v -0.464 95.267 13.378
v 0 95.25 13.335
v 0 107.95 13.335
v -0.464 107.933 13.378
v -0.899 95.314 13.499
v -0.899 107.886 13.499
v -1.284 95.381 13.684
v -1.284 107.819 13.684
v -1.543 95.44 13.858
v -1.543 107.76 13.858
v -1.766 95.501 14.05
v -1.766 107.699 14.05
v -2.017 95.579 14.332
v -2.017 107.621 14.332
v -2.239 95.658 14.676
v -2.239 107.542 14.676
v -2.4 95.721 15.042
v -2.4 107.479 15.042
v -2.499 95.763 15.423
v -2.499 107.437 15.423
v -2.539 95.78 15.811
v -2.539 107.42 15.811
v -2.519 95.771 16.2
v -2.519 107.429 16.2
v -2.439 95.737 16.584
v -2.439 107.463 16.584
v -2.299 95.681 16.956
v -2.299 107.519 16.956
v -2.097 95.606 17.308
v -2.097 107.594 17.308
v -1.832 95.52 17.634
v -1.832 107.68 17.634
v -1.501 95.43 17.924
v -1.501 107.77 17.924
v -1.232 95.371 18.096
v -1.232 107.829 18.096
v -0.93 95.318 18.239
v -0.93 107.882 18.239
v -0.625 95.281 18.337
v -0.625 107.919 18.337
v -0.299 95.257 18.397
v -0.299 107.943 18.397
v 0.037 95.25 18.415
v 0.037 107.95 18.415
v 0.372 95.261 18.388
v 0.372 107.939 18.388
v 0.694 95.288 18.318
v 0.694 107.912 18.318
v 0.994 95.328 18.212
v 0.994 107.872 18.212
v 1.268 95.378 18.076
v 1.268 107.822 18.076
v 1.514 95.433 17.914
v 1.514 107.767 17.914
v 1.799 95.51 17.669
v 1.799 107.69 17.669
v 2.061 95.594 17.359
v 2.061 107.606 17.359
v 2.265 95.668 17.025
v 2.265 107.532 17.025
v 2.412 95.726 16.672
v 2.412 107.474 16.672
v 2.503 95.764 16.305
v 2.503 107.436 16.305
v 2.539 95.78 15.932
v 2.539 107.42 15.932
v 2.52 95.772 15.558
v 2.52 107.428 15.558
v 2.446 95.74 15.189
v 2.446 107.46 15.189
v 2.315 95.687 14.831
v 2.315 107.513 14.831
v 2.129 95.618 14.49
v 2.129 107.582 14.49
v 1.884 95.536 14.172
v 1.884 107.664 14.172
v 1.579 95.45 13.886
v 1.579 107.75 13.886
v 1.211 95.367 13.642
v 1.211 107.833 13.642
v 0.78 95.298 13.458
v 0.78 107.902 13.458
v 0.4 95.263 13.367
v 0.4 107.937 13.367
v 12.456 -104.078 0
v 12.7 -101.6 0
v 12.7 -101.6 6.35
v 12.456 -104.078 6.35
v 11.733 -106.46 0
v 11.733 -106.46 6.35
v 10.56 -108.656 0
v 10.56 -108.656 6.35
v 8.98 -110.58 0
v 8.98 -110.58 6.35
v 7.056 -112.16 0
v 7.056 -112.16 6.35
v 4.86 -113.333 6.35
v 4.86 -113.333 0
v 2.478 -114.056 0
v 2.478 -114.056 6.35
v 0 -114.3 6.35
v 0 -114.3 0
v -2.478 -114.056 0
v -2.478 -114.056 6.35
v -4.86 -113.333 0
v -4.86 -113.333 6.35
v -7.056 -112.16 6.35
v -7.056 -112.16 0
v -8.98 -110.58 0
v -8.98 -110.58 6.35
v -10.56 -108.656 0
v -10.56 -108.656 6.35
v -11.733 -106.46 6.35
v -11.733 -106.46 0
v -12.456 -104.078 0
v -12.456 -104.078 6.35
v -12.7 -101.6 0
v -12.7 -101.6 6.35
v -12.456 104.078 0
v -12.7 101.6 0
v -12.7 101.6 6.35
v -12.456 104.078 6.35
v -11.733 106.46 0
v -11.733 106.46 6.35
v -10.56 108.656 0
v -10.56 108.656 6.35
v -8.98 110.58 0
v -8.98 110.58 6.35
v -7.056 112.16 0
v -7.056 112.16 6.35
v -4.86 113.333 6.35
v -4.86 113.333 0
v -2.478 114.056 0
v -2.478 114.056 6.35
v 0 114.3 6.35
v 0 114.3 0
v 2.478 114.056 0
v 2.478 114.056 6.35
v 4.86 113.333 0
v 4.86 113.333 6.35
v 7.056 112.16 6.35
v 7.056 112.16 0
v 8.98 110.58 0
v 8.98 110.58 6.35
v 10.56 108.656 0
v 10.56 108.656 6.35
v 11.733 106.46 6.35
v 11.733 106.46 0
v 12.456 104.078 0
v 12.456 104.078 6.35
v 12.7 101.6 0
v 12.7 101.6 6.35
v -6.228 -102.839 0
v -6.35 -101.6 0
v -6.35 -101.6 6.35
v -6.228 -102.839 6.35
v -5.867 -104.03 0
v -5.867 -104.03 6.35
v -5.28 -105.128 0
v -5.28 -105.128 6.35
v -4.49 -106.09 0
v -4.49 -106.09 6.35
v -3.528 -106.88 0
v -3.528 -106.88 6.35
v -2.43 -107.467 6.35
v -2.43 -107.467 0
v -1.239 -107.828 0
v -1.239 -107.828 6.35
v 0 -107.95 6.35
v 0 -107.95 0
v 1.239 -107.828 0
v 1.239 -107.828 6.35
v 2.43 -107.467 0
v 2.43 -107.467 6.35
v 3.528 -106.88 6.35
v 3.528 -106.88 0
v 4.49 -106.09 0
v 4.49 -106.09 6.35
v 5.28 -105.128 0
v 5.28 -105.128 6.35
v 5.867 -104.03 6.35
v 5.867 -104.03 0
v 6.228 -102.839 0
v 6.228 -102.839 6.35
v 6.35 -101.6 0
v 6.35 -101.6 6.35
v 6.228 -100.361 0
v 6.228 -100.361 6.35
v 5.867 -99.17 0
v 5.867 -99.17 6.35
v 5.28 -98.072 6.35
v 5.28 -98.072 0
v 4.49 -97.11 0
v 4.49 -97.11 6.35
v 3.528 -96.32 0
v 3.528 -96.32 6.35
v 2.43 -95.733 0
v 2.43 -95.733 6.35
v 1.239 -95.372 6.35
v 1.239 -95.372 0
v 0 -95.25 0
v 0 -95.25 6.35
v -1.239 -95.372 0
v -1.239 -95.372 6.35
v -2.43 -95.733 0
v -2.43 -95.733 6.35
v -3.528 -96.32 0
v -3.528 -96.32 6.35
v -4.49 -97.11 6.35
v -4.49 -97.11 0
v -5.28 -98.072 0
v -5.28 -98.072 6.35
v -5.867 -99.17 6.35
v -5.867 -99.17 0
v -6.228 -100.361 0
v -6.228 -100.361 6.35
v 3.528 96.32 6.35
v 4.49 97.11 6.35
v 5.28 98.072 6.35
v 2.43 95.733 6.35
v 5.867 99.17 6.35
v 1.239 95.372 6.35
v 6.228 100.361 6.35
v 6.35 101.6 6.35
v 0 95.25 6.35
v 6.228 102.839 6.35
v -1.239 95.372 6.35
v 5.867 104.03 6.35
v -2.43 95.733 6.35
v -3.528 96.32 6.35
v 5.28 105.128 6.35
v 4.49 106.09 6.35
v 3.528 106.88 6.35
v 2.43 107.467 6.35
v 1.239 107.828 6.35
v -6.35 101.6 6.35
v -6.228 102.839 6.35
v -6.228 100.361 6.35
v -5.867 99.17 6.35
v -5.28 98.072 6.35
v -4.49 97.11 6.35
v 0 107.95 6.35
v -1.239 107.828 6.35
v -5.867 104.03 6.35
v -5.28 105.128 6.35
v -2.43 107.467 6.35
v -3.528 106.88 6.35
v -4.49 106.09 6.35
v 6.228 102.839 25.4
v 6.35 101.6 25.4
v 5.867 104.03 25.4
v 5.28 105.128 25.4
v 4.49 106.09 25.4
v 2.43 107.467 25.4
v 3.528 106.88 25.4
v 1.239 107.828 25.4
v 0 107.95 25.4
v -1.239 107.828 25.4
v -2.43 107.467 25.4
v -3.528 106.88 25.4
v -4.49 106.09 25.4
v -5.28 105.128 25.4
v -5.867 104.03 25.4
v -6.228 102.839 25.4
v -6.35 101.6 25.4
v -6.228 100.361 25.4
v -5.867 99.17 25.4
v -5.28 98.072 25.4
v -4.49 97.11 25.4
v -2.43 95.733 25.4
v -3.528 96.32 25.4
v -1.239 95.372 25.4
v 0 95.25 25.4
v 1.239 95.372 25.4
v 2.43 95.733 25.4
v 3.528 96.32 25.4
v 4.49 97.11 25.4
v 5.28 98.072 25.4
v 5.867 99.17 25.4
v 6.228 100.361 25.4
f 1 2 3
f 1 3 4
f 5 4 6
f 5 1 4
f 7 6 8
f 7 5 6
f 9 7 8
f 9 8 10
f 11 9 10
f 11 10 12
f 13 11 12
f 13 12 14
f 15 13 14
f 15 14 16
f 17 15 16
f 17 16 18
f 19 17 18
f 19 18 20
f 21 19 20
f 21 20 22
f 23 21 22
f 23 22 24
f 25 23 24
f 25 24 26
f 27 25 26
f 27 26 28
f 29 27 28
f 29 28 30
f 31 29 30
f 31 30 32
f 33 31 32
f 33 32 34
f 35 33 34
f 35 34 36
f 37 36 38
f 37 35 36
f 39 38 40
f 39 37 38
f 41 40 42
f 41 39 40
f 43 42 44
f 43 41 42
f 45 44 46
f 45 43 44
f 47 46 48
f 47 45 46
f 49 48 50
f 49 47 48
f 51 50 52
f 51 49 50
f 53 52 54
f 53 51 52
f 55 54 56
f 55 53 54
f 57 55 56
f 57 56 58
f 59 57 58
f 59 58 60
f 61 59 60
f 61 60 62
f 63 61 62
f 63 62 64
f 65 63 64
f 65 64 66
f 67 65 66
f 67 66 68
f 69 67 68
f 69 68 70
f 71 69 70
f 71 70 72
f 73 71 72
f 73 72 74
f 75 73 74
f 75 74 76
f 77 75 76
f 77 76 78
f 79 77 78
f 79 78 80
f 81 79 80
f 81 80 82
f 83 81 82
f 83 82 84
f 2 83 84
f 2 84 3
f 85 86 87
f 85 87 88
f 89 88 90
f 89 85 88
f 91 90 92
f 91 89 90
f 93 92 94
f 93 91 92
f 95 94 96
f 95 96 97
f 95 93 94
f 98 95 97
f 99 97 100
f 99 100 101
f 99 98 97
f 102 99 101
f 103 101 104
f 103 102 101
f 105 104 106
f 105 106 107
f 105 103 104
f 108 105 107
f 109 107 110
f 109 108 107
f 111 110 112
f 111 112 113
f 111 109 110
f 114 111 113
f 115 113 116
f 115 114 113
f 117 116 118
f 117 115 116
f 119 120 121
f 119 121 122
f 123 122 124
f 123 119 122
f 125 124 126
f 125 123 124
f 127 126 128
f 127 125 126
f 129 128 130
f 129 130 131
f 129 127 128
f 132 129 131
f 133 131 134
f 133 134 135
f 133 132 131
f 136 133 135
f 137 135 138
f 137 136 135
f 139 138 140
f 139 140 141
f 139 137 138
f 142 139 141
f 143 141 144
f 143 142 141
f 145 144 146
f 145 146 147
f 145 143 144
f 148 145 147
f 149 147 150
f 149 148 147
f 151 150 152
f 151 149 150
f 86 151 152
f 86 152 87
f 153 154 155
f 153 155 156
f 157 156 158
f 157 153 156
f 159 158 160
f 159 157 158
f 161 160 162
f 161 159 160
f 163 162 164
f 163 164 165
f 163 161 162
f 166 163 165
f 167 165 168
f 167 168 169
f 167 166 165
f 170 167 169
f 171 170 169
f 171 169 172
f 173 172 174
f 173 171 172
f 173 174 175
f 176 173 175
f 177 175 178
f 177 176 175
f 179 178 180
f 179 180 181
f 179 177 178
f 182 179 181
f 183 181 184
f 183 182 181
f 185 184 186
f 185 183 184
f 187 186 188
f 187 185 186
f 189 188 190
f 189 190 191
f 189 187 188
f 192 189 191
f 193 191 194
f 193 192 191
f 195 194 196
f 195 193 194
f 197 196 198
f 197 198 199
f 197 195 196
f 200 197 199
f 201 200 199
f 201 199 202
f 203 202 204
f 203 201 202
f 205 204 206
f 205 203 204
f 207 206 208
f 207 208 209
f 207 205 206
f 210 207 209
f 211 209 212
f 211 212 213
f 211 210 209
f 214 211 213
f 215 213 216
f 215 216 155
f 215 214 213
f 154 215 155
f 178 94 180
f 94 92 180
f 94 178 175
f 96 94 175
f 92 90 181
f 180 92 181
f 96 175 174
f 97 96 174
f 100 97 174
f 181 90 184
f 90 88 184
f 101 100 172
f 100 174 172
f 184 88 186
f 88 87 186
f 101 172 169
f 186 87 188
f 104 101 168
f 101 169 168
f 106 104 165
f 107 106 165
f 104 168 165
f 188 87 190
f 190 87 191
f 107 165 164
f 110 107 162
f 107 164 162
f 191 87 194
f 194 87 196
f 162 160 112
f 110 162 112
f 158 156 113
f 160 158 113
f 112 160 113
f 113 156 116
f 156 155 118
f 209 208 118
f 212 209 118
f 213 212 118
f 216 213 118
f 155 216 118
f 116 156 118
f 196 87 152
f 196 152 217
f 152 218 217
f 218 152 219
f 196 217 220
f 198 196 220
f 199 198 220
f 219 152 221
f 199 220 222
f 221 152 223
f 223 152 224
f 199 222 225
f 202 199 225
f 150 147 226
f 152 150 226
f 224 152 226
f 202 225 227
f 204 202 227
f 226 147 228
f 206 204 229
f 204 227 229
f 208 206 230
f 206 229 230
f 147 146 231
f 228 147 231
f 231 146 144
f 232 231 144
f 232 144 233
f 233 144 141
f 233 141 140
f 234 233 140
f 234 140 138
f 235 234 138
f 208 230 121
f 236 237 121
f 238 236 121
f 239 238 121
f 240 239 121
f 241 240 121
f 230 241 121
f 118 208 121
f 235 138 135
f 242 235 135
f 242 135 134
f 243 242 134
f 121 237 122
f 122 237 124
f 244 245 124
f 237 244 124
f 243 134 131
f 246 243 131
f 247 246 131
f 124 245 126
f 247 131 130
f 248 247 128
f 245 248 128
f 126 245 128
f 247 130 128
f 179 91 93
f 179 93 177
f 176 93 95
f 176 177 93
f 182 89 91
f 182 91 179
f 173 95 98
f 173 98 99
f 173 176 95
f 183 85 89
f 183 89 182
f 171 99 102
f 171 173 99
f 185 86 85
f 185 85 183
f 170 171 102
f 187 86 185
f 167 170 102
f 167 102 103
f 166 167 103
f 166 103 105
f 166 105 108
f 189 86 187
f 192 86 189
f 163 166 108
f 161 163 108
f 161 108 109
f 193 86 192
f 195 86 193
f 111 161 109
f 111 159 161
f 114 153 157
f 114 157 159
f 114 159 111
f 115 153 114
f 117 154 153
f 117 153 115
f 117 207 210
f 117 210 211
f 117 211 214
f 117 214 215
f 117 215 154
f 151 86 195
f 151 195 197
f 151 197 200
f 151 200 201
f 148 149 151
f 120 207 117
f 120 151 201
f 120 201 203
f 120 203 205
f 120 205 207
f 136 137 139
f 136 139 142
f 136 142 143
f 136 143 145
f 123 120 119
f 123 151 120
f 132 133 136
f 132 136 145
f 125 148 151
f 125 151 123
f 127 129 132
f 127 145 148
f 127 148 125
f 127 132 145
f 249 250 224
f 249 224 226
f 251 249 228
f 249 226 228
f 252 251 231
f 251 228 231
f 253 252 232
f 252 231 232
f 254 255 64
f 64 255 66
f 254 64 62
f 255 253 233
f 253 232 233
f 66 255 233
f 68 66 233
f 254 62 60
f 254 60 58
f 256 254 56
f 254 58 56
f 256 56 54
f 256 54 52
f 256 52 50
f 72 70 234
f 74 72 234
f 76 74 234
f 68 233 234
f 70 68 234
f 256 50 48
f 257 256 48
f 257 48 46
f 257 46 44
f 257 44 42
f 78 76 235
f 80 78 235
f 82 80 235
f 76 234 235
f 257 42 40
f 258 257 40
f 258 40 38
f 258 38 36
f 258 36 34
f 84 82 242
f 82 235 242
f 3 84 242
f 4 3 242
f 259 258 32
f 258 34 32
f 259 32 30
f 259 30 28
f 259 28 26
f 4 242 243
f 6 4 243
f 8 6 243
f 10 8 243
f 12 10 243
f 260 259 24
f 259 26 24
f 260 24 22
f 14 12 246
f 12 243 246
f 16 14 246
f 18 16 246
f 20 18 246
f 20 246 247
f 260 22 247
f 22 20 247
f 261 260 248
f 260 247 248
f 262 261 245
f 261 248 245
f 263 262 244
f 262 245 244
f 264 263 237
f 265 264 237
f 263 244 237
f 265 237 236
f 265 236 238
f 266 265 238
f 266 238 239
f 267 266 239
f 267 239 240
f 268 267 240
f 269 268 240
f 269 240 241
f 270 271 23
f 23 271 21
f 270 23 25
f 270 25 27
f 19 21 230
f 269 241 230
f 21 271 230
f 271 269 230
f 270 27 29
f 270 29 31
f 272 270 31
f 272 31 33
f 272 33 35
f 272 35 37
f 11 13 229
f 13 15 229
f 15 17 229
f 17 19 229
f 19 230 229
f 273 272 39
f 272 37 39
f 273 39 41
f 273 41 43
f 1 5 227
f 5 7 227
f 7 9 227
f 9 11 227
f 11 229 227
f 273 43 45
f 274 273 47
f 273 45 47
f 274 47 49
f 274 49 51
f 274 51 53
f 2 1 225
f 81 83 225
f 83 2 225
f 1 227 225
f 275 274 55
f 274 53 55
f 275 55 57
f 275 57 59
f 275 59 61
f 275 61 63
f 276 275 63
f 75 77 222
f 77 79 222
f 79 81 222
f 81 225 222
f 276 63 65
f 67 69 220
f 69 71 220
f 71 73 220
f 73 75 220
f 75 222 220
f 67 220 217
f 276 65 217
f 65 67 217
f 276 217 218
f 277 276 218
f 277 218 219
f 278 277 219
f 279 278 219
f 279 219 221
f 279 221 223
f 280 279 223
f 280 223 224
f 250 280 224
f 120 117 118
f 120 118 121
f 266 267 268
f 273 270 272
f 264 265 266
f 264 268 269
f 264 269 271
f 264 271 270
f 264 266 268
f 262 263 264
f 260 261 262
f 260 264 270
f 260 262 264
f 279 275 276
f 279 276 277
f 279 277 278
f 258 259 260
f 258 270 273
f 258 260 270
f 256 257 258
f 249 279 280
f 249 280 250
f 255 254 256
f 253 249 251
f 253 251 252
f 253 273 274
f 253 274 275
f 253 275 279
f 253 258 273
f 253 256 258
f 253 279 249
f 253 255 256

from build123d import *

# Parameters (mm, degrees)
SKETCH1_R           = 6.35
BOSS_EXTRUDE1_DEPTH = 6.35
SKETCH2_R           = 6.35
BOSS_EXTRUDE3_DEPTH = 25.4
SKETCH5_R           = 2.54
CUT_EXTRUDE2_DEPTH  = 118.774954893


with BuildPart() as part:
    # Sketch1 → Boss-Extrude1 (new body)
    with BuildSketch(Plane.XY):
        with BuildLine():
            Line((-12.7, -101.6), (-12.7, 101.6))
            ThreePointArc((-12.7, 101.6), (0, 114.3), (12.7, 101.6))
            Line((12.7, 101.6), (12.7, -101.6))
            ThreePointArc((12.7, -101.6), (0, -114.3), (-12.7, -101.6))
        make_face()
        with Locations((0, 101.6)):
            Circle(SKETCH1_R, mode=Mode.SUBTRACT)
        with Locations(Location((0, -101.6, 0), (0, 0, 180))):
            Circle(SKETCH1_R, mode=Mode.SUBTRACT)
    extrude(amount=BOSS_EXTRUDE1_DEPTH)

    # Sketch2 → Boss-Extrude3 (add)
    with BuildSketch(Plane.XY):
        with Locations((0, 101.6)):
            Circle(SKETCH2_R)
    extrude(amount=BOSS_EXTRUDE3_DEPTH)

    # Sketch5 → Cut-Extrude2 (cut, through all)
    with BuildSketch(Plane(origin=(0, 0, 0), x_dir=(1, 0, 0), z_dir=(0, 1, 0))):
        with Locations(Location((0, -15.875, 0), (0, 0, 90))):
            Circle(SKETCH5_R)
    extrude(amount=CUT_EXTRUDE2_DEPTH, mode=Mode.SUBTRACT)


solid = part.part
